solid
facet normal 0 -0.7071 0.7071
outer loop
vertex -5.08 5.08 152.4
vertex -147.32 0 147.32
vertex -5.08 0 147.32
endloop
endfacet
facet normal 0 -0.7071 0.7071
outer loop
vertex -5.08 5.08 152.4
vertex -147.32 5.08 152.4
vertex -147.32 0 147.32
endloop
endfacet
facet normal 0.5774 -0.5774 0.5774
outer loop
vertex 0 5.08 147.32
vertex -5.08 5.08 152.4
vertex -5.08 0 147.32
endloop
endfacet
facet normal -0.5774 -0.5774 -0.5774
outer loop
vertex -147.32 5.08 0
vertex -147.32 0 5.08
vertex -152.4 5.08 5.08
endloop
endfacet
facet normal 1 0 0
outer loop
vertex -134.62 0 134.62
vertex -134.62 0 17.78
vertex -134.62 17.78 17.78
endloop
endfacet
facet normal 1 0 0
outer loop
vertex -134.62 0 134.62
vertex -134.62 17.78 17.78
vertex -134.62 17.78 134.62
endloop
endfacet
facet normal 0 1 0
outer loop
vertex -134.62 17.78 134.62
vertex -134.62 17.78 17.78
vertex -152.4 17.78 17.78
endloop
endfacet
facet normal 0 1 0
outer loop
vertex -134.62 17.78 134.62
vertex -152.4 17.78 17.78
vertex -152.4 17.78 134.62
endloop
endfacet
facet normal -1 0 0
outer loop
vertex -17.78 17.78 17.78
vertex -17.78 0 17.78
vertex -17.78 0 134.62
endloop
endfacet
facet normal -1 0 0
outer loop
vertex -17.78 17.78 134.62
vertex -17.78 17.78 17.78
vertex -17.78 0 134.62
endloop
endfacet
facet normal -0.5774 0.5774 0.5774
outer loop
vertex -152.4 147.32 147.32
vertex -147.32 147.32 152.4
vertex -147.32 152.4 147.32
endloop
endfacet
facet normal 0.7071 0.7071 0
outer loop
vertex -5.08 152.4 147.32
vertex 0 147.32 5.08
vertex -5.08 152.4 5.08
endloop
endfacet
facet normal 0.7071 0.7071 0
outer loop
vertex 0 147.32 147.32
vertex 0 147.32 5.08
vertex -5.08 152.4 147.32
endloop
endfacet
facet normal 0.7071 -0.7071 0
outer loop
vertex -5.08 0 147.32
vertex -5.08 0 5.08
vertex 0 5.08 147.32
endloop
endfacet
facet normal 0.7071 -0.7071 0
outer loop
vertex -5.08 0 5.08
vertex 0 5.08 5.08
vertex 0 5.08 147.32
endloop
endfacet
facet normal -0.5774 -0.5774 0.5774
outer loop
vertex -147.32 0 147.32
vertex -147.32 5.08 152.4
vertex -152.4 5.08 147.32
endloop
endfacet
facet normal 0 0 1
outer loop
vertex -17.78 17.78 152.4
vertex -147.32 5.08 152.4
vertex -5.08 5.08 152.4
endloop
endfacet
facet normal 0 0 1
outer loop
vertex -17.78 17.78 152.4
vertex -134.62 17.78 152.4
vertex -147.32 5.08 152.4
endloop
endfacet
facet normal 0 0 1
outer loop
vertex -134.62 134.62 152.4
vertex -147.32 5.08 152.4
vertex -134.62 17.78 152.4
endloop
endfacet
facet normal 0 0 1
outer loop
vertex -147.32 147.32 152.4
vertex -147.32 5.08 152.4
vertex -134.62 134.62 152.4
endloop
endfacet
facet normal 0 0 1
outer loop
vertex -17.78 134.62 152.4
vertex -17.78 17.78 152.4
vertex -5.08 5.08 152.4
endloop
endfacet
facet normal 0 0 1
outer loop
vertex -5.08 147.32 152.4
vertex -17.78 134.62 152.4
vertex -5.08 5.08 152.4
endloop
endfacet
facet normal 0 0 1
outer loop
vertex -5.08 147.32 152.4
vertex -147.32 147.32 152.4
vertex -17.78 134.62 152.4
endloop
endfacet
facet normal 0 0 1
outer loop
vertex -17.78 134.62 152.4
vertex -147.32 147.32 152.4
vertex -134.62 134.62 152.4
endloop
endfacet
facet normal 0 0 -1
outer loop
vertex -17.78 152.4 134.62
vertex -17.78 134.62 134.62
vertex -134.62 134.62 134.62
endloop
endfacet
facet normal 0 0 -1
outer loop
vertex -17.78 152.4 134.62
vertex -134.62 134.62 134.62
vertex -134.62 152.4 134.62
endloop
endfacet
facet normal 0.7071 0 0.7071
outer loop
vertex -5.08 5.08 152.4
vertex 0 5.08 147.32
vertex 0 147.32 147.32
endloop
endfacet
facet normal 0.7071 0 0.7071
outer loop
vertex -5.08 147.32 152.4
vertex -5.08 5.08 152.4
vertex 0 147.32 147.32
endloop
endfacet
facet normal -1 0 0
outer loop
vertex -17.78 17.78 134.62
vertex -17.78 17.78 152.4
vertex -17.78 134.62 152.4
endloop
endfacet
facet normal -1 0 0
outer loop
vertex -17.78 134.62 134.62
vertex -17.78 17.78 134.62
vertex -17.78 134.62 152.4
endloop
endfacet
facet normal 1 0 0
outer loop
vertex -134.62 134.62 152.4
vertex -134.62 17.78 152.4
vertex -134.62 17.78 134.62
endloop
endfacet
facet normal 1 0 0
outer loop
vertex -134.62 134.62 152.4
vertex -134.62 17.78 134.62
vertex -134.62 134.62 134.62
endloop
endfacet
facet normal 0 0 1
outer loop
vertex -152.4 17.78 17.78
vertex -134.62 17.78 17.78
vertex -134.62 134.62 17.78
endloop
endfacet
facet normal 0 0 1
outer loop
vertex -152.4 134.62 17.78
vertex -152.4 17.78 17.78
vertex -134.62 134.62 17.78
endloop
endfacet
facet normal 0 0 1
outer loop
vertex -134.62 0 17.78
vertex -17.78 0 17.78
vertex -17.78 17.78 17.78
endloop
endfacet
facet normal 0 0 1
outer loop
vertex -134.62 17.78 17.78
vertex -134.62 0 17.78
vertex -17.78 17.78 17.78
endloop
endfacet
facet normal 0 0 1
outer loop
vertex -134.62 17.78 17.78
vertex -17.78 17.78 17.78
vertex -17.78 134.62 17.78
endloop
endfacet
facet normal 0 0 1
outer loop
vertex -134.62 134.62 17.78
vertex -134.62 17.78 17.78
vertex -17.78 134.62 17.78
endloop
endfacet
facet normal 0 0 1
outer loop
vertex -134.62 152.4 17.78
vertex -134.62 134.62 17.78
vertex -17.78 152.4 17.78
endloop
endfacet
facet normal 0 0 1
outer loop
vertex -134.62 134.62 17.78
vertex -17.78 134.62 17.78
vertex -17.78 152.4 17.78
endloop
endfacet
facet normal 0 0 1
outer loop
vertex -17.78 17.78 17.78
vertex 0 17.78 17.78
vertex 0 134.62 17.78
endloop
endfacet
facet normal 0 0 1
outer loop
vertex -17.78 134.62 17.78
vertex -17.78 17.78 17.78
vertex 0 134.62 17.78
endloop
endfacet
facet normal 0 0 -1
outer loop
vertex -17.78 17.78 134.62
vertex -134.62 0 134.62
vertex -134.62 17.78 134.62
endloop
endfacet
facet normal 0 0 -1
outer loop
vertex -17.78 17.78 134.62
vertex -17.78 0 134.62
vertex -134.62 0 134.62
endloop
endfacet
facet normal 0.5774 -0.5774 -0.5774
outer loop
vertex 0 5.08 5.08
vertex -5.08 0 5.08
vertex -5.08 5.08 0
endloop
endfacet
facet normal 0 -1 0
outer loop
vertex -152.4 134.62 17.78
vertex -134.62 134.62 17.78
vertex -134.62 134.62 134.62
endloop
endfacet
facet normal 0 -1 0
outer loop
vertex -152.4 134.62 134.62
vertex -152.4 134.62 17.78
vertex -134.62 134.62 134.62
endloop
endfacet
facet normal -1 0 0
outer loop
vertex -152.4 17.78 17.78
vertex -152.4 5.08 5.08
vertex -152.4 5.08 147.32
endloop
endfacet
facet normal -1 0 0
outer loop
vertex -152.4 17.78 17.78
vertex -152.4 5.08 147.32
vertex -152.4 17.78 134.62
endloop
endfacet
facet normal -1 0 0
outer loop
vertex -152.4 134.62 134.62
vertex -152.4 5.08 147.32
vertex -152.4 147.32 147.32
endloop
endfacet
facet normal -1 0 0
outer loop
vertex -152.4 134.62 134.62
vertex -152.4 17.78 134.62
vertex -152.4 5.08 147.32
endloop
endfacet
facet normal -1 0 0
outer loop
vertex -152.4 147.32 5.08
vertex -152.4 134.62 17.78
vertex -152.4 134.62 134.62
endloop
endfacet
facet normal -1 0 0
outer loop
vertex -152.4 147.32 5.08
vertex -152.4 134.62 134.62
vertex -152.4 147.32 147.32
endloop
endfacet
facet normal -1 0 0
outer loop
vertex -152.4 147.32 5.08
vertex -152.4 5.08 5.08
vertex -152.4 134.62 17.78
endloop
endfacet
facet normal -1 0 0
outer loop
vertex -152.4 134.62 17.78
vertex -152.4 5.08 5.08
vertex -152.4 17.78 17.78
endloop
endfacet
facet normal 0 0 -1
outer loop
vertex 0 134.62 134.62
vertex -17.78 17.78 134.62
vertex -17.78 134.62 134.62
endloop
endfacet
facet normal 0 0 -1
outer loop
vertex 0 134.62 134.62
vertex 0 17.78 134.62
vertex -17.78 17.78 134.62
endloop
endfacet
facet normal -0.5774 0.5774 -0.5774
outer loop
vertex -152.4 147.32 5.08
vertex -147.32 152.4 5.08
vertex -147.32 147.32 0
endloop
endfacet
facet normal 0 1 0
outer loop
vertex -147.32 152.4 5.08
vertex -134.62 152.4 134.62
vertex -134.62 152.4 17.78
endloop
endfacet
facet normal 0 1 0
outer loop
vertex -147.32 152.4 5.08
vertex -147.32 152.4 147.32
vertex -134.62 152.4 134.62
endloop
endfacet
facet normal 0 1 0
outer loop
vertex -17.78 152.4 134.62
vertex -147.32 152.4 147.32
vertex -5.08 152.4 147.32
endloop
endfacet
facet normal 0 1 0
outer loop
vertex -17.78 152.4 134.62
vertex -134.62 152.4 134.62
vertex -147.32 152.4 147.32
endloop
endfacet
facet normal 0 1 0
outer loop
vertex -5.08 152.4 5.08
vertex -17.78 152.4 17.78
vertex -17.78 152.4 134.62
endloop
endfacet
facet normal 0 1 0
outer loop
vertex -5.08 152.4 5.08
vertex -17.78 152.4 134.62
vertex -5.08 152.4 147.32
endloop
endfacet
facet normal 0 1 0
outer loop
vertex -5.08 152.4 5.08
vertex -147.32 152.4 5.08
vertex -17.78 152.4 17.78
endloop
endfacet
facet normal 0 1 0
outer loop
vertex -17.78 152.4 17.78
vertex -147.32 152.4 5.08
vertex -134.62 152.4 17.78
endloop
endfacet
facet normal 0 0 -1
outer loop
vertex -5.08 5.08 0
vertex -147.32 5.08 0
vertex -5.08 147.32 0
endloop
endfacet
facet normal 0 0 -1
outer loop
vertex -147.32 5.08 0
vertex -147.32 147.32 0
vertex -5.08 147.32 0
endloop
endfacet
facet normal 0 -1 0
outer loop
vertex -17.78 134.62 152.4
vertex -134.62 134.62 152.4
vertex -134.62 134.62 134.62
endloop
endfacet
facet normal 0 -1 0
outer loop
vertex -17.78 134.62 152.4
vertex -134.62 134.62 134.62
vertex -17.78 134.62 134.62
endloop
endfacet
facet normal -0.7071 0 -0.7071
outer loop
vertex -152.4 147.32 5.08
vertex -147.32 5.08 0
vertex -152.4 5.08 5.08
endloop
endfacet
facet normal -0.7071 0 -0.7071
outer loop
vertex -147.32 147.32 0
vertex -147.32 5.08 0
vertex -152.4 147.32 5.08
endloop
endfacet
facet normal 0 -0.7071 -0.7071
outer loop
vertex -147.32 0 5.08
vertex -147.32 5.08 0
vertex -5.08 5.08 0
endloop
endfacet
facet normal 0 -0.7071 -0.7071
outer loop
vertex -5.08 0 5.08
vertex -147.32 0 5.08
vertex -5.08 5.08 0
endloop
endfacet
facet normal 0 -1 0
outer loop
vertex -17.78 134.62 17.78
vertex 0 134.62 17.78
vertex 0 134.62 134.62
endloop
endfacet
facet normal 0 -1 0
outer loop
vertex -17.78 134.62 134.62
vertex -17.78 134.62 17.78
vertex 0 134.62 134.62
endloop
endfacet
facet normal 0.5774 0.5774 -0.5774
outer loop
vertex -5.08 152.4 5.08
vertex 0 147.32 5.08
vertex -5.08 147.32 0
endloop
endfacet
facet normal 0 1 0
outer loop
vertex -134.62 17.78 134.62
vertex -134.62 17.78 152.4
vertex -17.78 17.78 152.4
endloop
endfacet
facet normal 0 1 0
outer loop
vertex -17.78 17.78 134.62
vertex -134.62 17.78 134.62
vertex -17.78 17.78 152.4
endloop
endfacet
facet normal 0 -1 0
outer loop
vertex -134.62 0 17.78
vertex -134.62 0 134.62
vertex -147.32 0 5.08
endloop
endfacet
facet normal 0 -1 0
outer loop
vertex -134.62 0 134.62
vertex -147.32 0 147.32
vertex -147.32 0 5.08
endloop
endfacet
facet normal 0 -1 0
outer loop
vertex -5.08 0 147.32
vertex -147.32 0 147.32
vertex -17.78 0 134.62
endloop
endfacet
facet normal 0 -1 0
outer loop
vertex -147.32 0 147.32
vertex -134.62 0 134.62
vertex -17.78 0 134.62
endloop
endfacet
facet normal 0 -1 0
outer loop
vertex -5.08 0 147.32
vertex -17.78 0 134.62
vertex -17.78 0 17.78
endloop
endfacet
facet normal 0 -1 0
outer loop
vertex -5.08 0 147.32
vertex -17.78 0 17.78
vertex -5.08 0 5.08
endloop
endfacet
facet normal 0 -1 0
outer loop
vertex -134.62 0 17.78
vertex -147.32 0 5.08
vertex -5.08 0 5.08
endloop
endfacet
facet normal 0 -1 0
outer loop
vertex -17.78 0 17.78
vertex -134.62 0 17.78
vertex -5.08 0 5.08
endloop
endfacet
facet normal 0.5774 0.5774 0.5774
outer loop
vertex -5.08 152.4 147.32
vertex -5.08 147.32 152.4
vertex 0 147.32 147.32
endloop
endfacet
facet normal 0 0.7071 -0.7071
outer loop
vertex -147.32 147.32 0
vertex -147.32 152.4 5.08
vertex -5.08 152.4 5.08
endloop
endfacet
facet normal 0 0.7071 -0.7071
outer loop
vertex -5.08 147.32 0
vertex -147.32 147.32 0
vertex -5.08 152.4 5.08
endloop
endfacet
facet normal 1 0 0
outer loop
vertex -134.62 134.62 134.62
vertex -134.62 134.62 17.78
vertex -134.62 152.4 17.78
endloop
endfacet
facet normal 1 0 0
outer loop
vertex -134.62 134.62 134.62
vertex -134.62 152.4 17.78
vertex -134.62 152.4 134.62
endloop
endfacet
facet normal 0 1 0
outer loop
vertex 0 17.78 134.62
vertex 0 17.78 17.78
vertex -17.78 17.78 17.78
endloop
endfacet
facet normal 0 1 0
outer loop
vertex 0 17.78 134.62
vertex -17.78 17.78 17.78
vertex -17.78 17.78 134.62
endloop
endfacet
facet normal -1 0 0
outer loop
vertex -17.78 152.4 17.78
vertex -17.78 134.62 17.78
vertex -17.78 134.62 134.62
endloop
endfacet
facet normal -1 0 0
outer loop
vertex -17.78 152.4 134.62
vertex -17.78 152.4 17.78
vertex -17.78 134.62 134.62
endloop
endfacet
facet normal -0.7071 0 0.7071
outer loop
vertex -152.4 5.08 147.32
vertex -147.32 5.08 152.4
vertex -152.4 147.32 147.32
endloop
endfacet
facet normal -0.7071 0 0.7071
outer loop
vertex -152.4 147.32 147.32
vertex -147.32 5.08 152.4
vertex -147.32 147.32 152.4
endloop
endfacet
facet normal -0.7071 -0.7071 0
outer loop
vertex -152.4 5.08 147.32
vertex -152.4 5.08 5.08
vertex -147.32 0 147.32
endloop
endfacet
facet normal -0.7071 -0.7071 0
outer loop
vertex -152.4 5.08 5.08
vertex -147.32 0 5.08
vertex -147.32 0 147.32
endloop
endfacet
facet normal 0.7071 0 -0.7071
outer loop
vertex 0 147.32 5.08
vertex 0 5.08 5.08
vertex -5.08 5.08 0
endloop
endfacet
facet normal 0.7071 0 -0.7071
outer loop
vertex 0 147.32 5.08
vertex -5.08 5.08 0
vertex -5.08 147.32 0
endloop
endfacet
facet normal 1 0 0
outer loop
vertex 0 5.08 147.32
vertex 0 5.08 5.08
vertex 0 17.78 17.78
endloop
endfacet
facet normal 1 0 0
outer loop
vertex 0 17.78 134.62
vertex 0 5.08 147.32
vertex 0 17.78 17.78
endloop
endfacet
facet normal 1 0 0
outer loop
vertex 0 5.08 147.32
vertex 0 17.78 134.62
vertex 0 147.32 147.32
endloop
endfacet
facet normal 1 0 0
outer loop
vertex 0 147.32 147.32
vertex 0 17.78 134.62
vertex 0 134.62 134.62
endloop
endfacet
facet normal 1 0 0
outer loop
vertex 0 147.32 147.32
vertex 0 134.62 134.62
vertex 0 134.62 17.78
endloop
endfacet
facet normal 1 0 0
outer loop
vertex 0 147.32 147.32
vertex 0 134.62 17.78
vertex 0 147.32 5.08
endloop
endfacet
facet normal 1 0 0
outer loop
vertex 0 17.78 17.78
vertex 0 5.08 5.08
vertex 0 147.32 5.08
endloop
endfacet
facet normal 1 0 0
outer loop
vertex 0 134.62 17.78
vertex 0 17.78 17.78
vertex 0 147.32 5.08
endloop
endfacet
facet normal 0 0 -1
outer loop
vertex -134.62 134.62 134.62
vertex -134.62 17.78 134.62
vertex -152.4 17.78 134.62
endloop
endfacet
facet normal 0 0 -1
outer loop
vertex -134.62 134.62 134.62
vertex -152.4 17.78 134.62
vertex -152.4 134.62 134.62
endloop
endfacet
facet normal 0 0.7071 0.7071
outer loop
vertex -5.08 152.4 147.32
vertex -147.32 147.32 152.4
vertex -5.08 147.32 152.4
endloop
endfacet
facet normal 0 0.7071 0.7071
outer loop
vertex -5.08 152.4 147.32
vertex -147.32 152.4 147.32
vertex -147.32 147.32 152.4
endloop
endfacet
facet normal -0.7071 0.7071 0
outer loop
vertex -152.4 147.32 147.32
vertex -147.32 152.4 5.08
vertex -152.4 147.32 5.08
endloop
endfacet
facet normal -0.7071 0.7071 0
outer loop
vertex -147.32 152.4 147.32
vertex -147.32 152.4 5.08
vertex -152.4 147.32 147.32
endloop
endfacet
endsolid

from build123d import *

# Parameters (mm, degrees)
F0_W     = 152.4
F0_H     = 152.4
F1_DEPTH = 152.4
F2_W     = 116.84
F2_H     = 116.84
F3_DEPTH = 152.401
F4_W     = 116.84
F4_H     = 116.84
F5_DEPTH = 152.401
F6_W     = 116.84
F6_H     = 116.84
F7_DEPTH = 17.78
F8_SIZE  = 5.08


with BuildPart() as f1:
    # F0 (on Top) → F1 (new body)
    with BuildSketch(Plane.XY):
        with Locations((-76.2, 76.2)):
            Rectangle(F0_W, F0_H)
    extrude(amount=F1_DEPTH)

    # F2 (on face) → F3 (cut, through all)
    with BuildSketch(Plane.XZ):
        with Locations((-76.2, 76.2)):
            Rectangle(F2_W, F2_H)
    extrude(amount=-F3_DEPTH, mode=Mode.SUBTRACT)

    # F4 (on face) → F5 (cut, through all)
    with BuildSketch(Plane.YZ):
        with Locations((76.2, 76.2)):
            Rectangle(F4_W, F4_H)
    extrude(amount=-F5_DEPTH, mode=Mode.SUBTRACT)

    # F6 (on face) → F7 (cut)
    with BuildSketch(Plane.XY.offset(152.4)):
        with Locations((-76.2, 76.2)):
            Rectangle(F6_W, F6_H)
    extrude(amount=-F7_DEPTH, mode=Mode.SUBTRACT)

    # F8
    f8_edges = [f1.edges().sort_by_distance(p)[0] for p in [
        (-76.2, 0, 152.4),
        (0, 76.2, 152.4),
        (0, 0, 76.2),
        (-76.2, 152.4, 152.4),
        (-152.4, 76.2, 152.4),
        (0, 152.4, 76.2),
        (-152.4, 152.4, 76.2),
        (-152.4, 0, 76.2),
        (-76.2, 0, 0),
        (0, 76.2, 0),
        (-76.2, 152.4, 0),
        (-152.4, 76.2, 0),
    ]]
    chamfer(f8_edges, length=F8_SIZE)


solid = f1.part
